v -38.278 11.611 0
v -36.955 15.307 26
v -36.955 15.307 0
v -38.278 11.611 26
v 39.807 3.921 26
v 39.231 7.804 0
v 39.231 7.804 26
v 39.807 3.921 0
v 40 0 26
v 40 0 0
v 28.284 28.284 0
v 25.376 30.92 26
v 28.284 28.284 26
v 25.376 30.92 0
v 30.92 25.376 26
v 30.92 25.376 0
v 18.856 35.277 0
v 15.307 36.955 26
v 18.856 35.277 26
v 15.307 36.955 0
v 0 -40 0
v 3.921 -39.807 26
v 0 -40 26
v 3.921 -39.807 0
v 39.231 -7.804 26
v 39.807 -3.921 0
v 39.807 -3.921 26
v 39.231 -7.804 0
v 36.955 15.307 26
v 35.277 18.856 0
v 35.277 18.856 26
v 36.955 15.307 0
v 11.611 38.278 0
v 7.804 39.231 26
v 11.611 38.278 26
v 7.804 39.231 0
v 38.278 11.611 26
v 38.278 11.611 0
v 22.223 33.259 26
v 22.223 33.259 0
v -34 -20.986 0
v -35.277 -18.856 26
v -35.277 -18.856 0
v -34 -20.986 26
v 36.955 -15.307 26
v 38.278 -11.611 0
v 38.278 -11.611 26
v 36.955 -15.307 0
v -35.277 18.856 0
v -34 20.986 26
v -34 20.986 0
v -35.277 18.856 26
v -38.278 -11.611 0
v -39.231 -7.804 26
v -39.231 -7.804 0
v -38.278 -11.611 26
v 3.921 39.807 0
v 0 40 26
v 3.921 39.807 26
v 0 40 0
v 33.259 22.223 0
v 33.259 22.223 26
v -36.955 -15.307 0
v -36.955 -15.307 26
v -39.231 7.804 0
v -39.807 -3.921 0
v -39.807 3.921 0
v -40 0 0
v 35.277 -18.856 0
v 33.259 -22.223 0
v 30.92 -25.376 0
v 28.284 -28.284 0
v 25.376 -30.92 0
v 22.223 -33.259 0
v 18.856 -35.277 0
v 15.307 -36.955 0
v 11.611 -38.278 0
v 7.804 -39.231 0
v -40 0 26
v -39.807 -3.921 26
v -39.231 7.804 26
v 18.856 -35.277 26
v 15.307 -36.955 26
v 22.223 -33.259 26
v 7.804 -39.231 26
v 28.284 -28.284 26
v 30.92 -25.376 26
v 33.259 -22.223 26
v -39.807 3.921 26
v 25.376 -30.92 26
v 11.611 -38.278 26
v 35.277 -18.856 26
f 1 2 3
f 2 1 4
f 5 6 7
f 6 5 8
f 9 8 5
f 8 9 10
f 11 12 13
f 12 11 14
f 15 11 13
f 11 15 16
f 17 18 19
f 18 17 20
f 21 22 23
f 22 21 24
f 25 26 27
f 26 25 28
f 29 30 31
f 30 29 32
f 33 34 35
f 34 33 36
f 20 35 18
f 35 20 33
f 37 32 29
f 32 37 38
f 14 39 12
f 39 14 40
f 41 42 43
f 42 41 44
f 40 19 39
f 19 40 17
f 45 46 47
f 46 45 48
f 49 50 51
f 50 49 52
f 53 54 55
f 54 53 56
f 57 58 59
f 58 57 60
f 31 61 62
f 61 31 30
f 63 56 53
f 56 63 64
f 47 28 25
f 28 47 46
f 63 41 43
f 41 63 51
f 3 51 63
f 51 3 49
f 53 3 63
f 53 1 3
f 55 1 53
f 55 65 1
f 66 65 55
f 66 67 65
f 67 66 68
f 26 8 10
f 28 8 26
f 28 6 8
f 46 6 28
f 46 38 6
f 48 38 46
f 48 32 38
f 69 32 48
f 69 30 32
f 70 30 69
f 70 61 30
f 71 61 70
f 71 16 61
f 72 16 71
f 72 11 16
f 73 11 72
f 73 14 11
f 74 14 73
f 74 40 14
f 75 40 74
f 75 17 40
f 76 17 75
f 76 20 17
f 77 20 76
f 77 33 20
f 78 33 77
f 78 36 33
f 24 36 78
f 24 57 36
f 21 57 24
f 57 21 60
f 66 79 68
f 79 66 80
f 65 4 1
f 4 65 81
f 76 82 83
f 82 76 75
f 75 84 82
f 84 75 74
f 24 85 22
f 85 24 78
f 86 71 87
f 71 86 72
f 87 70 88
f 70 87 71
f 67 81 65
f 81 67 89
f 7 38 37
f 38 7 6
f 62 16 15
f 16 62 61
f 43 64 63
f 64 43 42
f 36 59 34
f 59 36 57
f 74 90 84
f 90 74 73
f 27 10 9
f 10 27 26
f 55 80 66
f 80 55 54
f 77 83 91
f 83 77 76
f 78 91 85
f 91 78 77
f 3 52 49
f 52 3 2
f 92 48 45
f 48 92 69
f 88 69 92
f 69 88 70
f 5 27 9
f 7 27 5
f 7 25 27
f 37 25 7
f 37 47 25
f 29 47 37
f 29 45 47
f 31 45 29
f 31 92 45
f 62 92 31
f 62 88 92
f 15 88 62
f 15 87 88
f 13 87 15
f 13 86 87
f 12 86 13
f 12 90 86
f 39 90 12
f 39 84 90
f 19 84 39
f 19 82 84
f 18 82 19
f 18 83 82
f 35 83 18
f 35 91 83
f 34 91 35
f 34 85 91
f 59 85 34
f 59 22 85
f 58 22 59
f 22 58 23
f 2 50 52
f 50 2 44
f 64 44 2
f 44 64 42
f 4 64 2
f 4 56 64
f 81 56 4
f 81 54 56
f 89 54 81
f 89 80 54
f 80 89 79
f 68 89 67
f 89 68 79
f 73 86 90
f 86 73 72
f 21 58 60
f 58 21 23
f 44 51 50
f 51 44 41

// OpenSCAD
// Built by bench/smallmodels/features/compiler.py from a list of features.
$fn = 64;
difference() {
  union() {
    translate([0, 0, 0]) cylinder(d = 80, h = 26);
  }
  union() {
    translate([-17, 0, 0]) rotate([0, 0, 0]) translate([-17, -40, 0]) cube([34, 80, 26]);
  }
}
